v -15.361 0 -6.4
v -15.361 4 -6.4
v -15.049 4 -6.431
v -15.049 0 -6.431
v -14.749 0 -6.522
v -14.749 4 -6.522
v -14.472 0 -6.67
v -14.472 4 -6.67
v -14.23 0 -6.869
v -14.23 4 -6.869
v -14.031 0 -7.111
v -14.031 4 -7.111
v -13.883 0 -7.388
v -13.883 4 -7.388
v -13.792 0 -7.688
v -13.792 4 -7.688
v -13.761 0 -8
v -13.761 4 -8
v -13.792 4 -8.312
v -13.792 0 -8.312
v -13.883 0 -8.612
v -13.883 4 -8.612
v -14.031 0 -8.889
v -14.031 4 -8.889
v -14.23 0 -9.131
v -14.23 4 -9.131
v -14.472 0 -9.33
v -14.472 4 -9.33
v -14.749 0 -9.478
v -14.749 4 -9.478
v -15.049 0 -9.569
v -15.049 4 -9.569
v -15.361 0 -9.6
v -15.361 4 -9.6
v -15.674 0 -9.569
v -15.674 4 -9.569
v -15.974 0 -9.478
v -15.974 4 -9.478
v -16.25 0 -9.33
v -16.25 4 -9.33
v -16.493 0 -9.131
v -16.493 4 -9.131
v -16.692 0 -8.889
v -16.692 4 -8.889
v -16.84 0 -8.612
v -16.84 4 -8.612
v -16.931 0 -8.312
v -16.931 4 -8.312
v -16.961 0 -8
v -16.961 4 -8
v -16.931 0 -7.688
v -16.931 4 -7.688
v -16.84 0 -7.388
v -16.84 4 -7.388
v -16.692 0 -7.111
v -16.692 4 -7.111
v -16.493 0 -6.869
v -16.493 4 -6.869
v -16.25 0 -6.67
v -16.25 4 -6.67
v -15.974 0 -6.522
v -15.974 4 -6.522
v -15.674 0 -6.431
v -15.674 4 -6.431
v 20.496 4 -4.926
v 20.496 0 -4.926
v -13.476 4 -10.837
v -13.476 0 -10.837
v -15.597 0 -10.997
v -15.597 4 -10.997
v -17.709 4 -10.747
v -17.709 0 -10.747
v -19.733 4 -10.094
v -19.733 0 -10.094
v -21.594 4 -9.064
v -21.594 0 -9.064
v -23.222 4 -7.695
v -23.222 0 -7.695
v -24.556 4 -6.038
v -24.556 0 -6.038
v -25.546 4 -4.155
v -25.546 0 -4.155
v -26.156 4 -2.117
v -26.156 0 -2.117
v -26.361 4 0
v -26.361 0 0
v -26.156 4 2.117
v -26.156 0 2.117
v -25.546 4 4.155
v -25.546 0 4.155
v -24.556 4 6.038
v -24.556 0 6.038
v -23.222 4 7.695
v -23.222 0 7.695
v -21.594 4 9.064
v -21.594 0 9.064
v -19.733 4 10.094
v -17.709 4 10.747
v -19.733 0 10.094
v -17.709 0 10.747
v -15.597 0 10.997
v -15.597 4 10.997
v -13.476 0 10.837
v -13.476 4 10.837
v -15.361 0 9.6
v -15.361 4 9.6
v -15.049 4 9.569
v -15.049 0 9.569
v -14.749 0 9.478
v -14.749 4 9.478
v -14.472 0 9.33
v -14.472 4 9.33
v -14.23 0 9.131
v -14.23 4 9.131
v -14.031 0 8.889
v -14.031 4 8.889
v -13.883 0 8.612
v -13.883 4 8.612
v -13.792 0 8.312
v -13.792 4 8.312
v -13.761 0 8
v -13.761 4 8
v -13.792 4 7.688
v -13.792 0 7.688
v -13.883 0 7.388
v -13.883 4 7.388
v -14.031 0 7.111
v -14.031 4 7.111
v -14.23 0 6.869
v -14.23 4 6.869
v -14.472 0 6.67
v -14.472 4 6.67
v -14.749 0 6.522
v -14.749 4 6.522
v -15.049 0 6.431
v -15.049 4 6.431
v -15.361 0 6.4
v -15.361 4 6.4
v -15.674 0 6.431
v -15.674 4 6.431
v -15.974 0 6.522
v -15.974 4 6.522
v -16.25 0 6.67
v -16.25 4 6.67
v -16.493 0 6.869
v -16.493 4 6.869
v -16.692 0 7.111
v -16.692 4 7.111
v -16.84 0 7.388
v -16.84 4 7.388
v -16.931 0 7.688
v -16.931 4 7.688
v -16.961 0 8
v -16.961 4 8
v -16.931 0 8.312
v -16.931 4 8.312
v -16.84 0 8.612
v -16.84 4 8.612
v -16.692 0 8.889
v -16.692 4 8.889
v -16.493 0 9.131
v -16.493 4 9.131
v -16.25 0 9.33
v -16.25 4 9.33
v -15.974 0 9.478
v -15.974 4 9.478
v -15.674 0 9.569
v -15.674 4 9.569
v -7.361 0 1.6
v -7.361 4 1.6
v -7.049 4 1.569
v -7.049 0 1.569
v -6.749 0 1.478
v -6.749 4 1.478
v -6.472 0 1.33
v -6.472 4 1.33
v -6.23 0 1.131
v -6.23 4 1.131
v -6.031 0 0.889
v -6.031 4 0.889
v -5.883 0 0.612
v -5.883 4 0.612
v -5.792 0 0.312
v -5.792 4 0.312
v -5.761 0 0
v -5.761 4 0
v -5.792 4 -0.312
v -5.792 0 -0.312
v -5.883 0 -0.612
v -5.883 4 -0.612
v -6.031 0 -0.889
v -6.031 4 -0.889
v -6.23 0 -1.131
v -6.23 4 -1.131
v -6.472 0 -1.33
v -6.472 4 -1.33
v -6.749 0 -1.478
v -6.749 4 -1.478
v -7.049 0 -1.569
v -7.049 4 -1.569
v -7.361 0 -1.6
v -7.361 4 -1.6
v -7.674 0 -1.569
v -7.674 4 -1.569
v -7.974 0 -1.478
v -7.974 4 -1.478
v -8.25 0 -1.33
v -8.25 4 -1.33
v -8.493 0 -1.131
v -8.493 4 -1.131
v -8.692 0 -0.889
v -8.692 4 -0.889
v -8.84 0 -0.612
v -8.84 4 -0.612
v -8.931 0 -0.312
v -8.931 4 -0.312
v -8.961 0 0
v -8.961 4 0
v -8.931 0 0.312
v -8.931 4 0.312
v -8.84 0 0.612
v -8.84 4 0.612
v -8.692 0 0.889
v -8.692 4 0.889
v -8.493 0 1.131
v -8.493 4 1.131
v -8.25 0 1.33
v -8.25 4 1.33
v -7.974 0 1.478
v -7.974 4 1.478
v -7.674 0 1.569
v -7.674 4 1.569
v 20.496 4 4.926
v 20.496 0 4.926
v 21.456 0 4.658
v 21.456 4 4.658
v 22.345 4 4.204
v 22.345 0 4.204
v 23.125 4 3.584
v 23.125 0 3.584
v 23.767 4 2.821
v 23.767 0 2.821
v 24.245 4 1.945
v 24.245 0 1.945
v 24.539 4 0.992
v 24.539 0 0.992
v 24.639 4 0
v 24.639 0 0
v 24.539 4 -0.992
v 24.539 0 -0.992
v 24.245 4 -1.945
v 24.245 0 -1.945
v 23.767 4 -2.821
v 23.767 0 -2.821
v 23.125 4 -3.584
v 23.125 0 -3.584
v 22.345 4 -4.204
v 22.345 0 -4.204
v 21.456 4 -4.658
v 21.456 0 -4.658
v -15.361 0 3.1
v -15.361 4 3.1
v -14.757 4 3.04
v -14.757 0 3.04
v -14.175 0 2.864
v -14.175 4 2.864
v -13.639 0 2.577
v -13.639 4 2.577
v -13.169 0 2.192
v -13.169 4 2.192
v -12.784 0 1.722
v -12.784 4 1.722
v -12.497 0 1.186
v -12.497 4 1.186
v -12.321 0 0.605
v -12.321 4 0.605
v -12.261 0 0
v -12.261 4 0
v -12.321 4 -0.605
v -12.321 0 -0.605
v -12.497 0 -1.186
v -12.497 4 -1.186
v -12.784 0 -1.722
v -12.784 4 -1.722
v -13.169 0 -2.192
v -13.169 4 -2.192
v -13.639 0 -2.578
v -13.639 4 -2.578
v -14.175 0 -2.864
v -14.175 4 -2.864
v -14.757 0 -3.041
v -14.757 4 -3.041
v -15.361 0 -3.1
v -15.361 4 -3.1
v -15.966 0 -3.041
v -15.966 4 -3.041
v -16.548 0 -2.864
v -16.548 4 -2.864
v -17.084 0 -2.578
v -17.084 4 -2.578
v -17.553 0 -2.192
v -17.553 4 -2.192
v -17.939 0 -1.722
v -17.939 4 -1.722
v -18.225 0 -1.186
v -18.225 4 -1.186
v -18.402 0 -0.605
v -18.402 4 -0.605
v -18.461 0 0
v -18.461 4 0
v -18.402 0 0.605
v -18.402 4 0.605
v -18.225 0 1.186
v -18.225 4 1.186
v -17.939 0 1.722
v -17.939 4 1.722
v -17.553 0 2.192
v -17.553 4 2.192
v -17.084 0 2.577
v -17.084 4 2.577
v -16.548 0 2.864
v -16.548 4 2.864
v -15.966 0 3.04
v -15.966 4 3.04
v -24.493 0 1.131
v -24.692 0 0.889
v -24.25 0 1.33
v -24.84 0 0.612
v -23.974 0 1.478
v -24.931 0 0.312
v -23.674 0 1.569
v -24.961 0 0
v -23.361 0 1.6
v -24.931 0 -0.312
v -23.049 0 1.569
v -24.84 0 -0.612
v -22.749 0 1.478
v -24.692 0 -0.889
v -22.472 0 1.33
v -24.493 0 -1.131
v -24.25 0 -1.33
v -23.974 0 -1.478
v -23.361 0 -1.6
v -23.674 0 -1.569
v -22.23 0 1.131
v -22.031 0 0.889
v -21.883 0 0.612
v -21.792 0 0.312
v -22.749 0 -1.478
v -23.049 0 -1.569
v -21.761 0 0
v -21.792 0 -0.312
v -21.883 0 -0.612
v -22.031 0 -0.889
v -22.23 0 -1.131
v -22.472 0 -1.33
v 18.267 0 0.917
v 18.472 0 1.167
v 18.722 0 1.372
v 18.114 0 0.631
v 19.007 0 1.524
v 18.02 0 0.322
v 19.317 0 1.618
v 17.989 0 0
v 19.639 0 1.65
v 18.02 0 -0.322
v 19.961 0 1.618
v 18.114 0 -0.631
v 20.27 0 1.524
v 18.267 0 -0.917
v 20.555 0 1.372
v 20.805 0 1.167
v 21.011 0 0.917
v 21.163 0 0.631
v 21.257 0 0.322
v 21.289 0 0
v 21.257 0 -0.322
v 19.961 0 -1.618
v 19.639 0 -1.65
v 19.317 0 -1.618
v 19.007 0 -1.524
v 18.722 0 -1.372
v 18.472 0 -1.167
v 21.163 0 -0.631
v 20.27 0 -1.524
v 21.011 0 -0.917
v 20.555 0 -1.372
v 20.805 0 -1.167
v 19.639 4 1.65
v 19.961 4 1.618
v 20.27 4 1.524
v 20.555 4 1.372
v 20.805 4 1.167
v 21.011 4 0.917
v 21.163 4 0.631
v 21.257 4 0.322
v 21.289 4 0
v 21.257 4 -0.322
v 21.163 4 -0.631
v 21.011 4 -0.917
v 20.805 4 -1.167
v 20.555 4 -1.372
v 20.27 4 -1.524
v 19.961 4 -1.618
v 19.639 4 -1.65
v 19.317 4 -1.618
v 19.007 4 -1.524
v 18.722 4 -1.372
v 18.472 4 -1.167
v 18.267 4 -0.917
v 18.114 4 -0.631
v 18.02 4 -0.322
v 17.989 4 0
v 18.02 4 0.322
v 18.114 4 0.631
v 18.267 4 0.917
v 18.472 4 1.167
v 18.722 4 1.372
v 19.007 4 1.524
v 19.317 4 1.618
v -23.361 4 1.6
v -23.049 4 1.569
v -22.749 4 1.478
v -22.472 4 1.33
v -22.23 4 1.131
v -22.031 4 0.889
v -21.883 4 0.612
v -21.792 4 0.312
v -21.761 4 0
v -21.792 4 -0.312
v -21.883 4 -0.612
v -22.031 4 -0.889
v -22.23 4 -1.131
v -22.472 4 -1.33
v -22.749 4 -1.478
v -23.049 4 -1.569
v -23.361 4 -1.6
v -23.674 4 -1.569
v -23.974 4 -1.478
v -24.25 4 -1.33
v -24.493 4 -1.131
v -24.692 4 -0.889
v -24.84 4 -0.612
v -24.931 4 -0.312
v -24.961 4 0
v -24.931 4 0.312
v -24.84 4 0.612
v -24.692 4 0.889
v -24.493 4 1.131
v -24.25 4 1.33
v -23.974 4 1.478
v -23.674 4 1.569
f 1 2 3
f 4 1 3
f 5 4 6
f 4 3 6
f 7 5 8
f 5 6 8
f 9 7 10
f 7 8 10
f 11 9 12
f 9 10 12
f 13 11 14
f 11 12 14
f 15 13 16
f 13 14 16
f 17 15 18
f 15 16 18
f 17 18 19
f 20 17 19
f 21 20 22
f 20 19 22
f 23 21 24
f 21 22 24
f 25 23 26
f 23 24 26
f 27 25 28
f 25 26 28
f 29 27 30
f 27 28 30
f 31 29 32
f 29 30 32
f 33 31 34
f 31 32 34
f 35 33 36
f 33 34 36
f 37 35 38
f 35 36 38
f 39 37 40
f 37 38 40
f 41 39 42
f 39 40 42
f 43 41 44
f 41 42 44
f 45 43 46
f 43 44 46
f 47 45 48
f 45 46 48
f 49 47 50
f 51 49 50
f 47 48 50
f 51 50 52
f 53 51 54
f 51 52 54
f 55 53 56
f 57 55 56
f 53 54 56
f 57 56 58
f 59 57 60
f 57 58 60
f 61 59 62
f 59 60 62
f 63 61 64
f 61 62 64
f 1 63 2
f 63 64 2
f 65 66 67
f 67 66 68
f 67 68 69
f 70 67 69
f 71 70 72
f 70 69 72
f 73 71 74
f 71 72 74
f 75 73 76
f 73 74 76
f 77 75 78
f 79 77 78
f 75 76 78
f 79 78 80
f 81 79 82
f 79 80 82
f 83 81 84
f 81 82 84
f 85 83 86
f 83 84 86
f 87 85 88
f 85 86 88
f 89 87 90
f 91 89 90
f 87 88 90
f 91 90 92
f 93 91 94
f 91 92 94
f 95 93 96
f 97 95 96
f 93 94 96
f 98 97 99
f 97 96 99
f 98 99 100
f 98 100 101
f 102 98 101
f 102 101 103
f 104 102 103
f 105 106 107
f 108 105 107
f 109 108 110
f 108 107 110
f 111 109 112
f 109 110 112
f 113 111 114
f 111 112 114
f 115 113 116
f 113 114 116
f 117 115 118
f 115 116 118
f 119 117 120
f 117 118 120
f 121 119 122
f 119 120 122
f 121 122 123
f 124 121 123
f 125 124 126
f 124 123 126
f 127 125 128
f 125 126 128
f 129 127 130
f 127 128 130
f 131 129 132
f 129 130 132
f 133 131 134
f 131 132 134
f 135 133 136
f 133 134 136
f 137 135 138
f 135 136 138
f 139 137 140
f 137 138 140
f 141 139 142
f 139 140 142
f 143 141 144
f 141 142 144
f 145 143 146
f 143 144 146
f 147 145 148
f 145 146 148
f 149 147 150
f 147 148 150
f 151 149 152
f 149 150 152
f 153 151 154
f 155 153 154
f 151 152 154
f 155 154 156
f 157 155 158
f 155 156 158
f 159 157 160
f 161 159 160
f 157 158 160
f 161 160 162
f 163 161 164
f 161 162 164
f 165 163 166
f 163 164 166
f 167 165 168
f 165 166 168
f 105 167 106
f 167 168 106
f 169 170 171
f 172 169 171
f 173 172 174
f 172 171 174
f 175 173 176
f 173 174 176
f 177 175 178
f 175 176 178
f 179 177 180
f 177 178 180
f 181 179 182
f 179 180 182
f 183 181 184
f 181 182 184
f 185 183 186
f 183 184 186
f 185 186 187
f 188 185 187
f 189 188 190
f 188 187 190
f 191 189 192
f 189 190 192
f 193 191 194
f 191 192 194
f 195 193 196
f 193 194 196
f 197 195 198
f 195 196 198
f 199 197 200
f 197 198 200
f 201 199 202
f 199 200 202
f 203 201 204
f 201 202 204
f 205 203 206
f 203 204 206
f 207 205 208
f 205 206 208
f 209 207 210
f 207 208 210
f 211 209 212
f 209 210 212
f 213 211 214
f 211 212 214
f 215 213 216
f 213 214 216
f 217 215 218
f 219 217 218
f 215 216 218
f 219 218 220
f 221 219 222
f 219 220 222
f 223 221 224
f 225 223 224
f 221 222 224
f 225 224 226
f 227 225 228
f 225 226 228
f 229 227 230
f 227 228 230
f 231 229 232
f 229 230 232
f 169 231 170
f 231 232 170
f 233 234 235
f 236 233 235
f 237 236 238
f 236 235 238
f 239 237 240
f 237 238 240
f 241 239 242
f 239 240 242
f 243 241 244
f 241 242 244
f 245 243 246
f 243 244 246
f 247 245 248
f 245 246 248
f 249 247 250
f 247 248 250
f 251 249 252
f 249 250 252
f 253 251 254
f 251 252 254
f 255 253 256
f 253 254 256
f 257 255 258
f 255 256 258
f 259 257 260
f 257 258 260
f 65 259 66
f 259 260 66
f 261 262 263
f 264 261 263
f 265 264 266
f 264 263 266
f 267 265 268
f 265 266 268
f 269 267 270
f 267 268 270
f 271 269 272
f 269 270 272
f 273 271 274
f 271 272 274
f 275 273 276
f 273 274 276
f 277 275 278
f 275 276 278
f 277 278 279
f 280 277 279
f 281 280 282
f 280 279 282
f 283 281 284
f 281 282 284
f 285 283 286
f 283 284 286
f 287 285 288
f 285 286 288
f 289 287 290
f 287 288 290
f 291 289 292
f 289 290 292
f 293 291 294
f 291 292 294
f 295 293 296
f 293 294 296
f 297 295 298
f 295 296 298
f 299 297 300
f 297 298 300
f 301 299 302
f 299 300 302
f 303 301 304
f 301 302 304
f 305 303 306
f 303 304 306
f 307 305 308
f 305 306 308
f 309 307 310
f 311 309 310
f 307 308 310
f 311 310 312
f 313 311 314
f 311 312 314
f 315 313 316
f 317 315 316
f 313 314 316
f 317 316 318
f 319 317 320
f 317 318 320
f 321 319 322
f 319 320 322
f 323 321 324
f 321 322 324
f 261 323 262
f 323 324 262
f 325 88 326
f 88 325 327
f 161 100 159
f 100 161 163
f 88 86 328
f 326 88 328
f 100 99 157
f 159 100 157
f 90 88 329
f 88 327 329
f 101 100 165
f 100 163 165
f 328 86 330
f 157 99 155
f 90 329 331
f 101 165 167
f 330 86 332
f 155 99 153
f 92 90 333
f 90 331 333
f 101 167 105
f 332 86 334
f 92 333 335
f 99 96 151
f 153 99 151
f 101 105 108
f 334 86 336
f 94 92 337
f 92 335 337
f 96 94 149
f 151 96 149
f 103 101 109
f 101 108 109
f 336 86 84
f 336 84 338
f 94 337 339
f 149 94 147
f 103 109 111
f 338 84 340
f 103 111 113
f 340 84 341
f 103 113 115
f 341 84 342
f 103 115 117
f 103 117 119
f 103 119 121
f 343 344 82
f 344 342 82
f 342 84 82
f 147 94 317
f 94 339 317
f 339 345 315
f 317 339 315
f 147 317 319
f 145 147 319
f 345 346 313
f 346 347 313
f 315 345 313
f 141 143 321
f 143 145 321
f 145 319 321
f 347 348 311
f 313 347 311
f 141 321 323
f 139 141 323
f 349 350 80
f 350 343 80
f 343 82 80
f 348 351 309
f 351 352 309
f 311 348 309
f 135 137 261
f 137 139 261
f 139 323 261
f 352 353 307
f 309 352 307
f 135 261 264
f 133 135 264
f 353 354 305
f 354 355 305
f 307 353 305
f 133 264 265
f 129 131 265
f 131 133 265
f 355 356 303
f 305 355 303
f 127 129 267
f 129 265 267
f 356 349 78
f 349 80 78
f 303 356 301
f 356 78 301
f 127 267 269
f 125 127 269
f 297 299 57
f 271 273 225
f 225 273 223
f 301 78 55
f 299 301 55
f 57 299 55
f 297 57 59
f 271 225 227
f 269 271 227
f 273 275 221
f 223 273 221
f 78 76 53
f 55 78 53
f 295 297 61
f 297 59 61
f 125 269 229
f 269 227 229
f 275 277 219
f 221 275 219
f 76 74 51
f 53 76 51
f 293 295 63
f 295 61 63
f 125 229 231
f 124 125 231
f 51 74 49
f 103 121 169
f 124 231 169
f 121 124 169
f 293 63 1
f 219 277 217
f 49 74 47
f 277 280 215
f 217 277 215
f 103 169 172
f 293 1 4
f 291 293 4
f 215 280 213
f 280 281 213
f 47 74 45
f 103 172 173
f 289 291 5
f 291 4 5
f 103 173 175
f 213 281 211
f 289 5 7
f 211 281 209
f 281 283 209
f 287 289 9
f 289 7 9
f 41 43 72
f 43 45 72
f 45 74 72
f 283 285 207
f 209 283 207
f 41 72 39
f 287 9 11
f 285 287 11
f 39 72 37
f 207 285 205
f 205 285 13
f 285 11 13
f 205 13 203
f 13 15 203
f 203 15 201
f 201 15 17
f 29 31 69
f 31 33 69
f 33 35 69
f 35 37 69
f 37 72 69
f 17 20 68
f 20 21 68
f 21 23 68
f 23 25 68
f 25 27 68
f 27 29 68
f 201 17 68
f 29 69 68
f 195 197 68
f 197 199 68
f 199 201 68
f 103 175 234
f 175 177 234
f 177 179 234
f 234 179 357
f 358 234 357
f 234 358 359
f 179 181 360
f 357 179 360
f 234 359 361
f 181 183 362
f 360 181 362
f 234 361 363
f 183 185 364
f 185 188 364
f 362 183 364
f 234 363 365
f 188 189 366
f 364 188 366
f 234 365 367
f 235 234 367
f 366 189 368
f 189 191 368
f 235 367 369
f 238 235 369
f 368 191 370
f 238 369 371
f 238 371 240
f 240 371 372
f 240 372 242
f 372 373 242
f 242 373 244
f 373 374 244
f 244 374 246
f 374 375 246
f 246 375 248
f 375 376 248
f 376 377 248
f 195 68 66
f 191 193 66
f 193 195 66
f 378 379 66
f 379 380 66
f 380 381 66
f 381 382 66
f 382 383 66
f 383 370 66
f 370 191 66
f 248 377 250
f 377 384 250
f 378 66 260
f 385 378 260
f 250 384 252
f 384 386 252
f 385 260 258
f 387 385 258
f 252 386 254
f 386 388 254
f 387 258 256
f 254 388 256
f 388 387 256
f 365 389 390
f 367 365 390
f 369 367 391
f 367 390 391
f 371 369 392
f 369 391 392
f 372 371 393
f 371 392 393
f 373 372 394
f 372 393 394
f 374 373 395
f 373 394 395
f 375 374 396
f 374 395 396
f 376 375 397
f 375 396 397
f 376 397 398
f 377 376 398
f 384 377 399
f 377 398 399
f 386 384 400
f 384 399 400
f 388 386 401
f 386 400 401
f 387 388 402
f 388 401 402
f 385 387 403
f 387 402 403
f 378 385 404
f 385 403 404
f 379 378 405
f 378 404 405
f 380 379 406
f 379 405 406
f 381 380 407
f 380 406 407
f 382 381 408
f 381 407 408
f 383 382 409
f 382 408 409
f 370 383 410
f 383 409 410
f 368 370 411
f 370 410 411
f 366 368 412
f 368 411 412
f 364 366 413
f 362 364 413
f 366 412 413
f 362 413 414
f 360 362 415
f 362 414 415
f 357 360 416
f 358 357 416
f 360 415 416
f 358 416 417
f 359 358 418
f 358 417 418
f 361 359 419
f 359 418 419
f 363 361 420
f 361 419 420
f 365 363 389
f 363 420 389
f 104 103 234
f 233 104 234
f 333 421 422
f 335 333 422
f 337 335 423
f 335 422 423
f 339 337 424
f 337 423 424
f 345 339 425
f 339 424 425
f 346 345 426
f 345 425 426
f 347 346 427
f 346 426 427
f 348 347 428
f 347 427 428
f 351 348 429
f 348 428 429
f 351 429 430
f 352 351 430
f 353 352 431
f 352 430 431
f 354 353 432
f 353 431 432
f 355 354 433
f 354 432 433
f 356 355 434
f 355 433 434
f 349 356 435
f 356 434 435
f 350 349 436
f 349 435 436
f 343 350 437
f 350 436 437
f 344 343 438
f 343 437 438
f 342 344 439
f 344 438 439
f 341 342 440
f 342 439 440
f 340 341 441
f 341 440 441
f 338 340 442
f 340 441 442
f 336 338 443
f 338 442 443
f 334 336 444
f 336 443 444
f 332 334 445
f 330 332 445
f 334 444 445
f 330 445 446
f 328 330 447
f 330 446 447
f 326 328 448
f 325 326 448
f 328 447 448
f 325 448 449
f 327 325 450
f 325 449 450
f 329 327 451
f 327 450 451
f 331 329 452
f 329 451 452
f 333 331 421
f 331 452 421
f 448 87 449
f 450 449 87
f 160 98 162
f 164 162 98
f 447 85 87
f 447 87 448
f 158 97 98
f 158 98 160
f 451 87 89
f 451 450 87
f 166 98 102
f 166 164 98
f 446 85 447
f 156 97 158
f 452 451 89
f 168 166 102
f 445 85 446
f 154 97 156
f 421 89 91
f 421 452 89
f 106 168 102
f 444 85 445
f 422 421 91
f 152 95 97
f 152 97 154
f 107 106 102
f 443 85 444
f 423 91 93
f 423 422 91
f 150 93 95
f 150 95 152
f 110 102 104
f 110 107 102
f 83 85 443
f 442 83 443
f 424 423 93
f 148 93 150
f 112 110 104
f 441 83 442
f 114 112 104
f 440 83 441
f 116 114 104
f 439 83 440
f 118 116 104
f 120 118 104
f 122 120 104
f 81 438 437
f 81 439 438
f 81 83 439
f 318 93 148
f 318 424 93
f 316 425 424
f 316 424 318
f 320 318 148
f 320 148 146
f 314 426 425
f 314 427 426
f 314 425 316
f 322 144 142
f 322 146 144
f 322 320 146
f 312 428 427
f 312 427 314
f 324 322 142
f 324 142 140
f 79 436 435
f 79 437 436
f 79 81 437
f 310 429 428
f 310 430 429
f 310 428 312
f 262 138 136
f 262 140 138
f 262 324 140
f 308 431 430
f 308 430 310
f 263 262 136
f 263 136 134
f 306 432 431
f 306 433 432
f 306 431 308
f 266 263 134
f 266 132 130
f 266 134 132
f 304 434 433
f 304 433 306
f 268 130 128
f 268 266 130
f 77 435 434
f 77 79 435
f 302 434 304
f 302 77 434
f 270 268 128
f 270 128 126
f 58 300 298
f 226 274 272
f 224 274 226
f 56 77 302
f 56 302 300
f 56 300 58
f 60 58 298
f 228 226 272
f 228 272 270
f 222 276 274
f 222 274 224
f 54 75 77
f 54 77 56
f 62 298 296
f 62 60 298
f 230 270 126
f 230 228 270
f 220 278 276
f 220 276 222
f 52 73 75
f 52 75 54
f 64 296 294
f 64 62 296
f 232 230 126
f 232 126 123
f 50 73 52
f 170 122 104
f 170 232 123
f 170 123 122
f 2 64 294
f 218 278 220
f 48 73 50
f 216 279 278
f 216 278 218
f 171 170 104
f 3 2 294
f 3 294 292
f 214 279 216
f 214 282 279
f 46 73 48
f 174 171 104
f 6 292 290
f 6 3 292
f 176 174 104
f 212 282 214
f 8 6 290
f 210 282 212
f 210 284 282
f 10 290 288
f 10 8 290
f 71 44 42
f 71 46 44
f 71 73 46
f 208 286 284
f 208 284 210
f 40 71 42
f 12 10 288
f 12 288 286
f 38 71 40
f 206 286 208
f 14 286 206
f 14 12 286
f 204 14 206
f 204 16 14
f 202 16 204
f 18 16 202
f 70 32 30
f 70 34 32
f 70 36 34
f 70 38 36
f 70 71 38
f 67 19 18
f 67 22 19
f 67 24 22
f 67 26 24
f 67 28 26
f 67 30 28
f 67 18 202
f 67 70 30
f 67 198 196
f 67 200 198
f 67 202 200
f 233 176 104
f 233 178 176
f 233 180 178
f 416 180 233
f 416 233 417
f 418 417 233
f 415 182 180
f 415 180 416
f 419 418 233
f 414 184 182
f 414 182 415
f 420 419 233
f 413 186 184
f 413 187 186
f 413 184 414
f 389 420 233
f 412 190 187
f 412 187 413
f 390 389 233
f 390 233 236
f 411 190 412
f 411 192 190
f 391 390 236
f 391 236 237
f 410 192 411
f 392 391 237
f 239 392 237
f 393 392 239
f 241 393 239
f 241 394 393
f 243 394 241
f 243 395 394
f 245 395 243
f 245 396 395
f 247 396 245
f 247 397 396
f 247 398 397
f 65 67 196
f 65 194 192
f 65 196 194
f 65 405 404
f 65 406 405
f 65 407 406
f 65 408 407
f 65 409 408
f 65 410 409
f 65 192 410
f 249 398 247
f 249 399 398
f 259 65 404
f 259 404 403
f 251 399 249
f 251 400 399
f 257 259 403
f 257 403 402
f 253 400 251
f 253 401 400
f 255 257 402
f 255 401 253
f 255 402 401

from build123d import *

# Parameters (mm, degrees)
EXTRUDE_1_DEPTH     = 4
SKETCH_3_R          = 3.1
SKETCH_3_R_2        = 1.6
SKETCH_3_R_3        = 1.65
CUT_EXTRUDE_1_DEPTH = 4


with BuildPart() as part:
    # 草图1 → 凸台-拉伸1 (new body)
    with BuildSketch(Plane(origin=(0, 0, 0), x_dir=(1, 0, 0), z_dir=(0, 1, 0))):
        with BuildLine():
            Line((20.495765525, 4.925982785), (-13.475662945, 10.837162075))
            ThreePointArc((-13.475662945, 10.837162075), (-26.361377172, 4.5e-08), (-13.475663034, -10.837162091))
            Line((-13.475663034, -10.837162091), (20.495765576, -4.925982776))
            ThreePointArc((20.495765576, -4.925982776), (24.638622828, 2.6e-08), (20.495765525, 4.925982785))
        make_face()
    extrude(amount=EXTRUDE_1_DEPTH)

    # 草图3 → 切除-拉伸1 (cut)
    with BuildSketch(Plane(origin=(0, 4, 0), x_dir=(1, 0, 0), z_dir=(0, 1, 0))):
        with Locations(Location((-15.36137507, 8.881e-05, 0), (0, 0, 270))):
            Circle(SKETCH_3_R)
        with Locations(Location((-23.36137507, 8.881e-05, 0), (0, 0, 270))):
            Circle(SKETCH_3_R_2)
        with Locations(Location((-15.36137507, 8.00008881, 0), (0, 0, 270))):
            Circle(SKETCH_3_R_2)
        with Locations(Location((-7.36137507, 8.881e-05, 0), (0, 0, 270))):
            Circle(SKETCH_3_R_2)
        with Locations(Location((-15.36137507, -7.99991119, 0), (0, 0, 270))):
            Circle(SKETCH_3_R_2)
        with Locations(Location((19.638622828, 0, 0), (0, 0, 270))):
            Circle(SKETCH_3_R_3)
    extrude(amount=-CUT_EXTRUDE_1_DEPTH, mode=Mode.SUBTRACT)


solid = part.part
